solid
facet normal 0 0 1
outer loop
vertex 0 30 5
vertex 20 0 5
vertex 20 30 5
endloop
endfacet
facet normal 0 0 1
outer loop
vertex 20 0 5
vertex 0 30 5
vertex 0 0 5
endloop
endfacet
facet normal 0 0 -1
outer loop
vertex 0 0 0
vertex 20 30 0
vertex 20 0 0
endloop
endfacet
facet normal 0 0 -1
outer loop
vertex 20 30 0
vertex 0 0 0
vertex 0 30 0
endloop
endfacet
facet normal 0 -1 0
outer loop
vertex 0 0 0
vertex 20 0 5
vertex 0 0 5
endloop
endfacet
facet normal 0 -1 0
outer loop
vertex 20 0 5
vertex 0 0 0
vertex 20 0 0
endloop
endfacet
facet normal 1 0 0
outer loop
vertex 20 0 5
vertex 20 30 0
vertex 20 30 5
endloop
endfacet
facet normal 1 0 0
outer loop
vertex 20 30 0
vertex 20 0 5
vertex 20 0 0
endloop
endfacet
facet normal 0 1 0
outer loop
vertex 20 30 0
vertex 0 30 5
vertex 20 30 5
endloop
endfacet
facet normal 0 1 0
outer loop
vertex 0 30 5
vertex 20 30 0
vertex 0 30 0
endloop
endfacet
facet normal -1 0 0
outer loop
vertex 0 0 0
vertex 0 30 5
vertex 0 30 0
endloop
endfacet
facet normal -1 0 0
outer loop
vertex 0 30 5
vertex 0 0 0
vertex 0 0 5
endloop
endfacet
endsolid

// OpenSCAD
// negative: no semicolon after a module call (OpenSCAD would make the next line an ignored child)
// expect-reject-line: 4
cube([20, 30, 5])
translate([4, 4, 0]) cylinder(d = 3, h = 6);
